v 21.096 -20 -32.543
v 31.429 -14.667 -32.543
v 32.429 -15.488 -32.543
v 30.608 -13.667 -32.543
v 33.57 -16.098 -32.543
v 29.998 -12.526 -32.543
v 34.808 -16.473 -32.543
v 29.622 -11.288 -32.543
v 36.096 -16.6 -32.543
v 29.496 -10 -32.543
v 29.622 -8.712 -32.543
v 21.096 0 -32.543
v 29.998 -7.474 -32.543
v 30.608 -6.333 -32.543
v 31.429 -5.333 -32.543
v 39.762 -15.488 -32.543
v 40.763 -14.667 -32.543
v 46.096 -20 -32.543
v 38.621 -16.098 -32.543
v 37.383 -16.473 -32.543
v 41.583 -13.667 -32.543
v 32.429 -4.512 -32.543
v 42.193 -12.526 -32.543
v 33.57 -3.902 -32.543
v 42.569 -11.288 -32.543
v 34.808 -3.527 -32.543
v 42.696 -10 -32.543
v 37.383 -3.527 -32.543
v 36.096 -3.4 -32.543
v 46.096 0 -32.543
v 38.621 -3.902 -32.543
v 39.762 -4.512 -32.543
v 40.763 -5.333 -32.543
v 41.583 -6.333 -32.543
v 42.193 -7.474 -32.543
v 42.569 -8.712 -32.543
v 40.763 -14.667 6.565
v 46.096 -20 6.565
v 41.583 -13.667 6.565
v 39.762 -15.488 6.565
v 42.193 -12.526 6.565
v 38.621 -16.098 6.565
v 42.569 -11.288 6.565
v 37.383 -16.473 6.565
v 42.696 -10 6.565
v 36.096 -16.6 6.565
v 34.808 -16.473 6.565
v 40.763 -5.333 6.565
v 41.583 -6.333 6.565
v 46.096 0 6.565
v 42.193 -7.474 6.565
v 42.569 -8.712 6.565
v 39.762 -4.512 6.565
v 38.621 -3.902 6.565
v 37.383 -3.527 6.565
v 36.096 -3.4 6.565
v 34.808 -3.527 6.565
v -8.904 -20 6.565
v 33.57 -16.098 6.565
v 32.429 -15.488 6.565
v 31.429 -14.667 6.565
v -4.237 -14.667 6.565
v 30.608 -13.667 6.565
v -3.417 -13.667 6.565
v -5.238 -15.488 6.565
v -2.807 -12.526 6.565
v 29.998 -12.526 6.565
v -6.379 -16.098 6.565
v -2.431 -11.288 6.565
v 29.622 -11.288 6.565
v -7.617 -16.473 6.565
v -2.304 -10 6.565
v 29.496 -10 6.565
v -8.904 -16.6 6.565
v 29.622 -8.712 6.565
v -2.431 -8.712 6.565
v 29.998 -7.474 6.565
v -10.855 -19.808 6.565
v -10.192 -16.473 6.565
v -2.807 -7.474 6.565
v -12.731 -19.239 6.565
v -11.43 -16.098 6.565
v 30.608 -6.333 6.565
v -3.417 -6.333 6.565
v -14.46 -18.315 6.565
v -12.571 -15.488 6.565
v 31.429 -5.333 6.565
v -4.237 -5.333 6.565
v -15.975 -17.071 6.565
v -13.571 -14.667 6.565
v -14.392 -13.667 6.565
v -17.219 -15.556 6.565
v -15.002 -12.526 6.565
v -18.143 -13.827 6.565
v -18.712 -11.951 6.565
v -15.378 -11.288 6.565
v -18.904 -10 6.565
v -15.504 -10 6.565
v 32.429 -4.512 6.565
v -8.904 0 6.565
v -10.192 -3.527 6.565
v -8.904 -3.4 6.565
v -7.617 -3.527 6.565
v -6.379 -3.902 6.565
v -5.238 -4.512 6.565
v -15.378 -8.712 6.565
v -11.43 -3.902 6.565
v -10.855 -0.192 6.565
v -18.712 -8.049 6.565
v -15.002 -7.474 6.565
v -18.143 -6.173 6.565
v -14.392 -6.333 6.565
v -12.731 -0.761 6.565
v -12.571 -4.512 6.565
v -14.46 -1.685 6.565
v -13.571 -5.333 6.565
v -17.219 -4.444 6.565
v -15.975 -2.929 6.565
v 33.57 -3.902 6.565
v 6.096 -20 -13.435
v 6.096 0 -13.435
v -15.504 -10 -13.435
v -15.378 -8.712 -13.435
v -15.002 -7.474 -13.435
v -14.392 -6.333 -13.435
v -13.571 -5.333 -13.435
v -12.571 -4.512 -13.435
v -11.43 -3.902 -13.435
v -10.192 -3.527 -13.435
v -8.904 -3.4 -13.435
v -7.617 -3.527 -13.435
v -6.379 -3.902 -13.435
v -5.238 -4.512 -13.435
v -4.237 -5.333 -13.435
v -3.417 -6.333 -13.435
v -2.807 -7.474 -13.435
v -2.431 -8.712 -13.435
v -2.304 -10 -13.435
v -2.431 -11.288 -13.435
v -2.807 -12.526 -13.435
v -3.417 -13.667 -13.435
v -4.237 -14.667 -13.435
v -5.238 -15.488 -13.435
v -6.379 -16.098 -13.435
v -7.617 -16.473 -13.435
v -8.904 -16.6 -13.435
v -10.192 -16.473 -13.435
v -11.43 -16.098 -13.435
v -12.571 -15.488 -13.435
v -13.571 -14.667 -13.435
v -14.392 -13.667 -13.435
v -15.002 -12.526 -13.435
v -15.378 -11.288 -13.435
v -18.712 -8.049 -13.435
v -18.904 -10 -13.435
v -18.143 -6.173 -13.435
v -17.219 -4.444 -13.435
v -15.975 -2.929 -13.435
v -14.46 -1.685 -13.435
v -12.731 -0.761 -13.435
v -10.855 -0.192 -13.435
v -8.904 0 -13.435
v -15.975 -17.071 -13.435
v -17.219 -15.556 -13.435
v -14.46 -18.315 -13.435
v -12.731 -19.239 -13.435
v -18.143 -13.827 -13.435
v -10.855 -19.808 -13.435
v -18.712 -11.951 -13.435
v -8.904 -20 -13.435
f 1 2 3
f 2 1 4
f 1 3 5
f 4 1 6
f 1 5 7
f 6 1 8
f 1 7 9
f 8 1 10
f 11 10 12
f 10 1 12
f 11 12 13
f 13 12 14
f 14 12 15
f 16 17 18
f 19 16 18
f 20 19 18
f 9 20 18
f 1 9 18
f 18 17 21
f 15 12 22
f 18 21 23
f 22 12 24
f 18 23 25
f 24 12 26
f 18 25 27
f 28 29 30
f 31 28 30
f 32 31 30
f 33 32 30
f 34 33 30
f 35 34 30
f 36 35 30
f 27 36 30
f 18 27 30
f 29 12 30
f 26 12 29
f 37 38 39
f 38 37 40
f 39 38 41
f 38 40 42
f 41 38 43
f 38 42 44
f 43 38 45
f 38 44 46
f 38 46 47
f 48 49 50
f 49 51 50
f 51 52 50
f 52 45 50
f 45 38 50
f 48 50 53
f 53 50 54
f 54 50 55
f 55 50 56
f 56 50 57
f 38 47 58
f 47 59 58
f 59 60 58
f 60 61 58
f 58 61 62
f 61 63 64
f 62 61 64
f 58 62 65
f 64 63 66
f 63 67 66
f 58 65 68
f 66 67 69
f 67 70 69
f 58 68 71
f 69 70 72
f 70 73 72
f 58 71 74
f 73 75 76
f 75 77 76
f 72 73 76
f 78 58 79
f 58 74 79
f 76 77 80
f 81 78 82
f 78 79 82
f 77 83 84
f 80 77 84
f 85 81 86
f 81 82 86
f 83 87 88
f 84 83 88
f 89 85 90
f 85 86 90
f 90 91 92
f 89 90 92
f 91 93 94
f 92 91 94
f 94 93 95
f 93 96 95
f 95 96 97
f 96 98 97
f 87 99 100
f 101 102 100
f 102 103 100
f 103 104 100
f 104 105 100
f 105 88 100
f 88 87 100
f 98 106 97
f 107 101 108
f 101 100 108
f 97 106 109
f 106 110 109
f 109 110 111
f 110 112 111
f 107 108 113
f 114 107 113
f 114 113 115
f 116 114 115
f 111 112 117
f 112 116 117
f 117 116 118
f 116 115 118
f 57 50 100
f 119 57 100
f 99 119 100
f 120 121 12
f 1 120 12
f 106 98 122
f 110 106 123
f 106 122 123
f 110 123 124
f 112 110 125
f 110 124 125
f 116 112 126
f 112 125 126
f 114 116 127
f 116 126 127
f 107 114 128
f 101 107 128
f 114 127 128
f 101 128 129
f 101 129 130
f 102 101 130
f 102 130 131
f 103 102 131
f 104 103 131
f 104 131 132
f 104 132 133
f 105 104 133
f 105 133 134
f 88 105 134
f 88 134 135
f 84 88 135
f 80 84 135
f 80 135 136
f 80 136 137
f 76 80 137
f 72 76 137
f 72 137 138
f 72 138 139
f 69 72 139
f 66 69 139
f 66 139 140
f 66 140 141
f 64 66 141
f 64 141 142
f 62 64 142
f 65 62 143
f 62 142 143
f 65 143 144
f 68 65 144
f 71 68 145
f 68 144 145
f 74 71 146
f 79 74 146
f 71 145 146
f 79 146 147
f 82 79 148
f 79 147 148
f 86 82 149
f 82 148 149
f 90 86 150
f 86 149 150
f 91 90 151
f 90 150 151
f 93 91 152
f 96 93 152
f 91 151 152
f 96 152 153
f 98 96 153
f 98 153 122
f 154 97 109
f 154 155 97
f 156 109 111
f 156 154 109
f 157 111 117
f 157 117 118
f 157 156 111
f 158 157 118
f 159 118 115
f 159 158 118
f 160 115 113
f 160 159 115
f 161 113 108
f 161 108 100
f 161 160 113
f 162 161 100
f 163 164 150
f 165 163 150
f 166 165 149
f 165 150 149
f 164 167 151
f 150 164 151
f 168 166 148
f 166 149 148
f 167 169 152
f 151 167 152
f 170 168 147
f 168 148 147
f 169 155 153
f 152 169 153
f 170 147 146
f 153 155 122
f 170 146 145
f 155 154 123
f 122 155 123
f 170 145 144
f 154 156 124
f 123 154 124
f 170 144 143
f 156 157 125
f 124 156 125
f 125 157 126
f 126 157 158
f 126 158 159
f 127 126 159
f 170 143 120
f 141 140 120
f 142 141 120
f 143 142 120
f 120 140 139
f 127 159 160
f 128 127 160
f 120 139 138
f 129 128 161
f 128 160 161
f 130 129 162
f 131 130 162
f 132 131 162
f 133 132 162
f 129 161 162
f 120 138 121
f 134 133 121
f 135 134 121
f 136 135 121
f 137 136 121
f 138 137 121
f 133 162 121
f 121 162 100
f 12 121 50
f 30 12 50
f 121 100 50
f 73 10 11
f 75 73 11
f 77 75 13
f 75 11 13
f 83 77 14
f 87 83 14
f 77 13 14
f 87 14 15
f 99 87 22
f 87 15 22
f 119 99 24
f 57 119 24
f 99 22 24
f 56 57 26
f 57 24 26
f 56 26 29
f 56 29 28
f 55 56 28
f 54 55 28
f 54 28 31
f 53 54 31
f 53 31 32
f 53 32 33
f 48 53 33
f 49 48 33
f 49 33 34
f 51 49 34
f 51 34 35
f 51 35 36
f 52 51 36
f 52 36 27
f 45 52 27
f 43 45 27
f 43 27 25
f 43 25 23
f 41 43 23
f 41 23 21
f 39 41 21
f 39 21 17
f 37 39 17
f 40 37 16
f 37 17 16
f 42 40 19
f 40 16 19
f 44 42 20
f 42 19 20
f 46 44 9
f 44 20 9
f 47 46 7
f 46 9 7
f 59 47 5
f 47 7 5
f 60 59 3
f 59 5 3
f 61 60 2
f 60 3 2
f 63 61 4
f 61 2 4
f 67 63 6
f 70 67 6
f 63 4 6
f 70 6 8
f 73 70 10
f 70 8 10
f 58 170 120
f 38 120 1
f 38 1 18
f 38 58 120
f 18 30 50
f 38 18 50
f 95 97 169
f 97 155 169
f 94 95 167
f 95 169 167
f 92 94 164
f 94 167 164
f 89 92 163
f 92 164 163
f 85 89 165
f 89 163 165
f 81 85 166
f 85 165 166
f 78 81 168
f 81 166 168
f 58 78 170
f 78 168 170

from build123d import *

# Parameters (mm, degrees)
F1_DEPTH       = 20
F2_R           = 9.99999
F4_D           = 13.2
F4_CBORE_D     = 19.25
F4_CBORE_DEPTH = 0


# Not quite as in the source:
# - a fillet or chamfer is up to 0.001 mm smaller than in the source, because OpenCascade refuses the exact size


with BuildPart() as f1:
    # F0 (on Front) → F1 (new body)
    with BuildSketch(Plane.XZ):
        Polygon((46.0956162758, 6.5648934066), (-18.9043837242, 6.5648934066), (-18.9043837242, -13.4351065934), (6.0956162758, -13.4351065934), (21.0956162758, -32.5433855138), (46.0956162758, -32.5433855138), align=None)
    extrude(amount=F1_DEPTH)

    # F2 (radius 10 in the source; OpenCascade refuses exactly that, so slightly less here)
    f2_edges = [f1.edges().sort_by_distance(p)[0] for p in [
        (-18.904384, 0, -3.435107),
        (-18.904384, -20, -3.435107),
    ]]
    fillet(f2_edges, radius=F2_R)

    # F4 (through all)
    with Locations(Plane.XY.offset(6.5648934066)):
        with Locations((-8.9043837242, -10), (36.0956162758, -10)):
            CounterBoreHole(F4_D / 2, F4_CBORE_D / 2, F4_CBORE_DEPTH)


solid = f1.part
